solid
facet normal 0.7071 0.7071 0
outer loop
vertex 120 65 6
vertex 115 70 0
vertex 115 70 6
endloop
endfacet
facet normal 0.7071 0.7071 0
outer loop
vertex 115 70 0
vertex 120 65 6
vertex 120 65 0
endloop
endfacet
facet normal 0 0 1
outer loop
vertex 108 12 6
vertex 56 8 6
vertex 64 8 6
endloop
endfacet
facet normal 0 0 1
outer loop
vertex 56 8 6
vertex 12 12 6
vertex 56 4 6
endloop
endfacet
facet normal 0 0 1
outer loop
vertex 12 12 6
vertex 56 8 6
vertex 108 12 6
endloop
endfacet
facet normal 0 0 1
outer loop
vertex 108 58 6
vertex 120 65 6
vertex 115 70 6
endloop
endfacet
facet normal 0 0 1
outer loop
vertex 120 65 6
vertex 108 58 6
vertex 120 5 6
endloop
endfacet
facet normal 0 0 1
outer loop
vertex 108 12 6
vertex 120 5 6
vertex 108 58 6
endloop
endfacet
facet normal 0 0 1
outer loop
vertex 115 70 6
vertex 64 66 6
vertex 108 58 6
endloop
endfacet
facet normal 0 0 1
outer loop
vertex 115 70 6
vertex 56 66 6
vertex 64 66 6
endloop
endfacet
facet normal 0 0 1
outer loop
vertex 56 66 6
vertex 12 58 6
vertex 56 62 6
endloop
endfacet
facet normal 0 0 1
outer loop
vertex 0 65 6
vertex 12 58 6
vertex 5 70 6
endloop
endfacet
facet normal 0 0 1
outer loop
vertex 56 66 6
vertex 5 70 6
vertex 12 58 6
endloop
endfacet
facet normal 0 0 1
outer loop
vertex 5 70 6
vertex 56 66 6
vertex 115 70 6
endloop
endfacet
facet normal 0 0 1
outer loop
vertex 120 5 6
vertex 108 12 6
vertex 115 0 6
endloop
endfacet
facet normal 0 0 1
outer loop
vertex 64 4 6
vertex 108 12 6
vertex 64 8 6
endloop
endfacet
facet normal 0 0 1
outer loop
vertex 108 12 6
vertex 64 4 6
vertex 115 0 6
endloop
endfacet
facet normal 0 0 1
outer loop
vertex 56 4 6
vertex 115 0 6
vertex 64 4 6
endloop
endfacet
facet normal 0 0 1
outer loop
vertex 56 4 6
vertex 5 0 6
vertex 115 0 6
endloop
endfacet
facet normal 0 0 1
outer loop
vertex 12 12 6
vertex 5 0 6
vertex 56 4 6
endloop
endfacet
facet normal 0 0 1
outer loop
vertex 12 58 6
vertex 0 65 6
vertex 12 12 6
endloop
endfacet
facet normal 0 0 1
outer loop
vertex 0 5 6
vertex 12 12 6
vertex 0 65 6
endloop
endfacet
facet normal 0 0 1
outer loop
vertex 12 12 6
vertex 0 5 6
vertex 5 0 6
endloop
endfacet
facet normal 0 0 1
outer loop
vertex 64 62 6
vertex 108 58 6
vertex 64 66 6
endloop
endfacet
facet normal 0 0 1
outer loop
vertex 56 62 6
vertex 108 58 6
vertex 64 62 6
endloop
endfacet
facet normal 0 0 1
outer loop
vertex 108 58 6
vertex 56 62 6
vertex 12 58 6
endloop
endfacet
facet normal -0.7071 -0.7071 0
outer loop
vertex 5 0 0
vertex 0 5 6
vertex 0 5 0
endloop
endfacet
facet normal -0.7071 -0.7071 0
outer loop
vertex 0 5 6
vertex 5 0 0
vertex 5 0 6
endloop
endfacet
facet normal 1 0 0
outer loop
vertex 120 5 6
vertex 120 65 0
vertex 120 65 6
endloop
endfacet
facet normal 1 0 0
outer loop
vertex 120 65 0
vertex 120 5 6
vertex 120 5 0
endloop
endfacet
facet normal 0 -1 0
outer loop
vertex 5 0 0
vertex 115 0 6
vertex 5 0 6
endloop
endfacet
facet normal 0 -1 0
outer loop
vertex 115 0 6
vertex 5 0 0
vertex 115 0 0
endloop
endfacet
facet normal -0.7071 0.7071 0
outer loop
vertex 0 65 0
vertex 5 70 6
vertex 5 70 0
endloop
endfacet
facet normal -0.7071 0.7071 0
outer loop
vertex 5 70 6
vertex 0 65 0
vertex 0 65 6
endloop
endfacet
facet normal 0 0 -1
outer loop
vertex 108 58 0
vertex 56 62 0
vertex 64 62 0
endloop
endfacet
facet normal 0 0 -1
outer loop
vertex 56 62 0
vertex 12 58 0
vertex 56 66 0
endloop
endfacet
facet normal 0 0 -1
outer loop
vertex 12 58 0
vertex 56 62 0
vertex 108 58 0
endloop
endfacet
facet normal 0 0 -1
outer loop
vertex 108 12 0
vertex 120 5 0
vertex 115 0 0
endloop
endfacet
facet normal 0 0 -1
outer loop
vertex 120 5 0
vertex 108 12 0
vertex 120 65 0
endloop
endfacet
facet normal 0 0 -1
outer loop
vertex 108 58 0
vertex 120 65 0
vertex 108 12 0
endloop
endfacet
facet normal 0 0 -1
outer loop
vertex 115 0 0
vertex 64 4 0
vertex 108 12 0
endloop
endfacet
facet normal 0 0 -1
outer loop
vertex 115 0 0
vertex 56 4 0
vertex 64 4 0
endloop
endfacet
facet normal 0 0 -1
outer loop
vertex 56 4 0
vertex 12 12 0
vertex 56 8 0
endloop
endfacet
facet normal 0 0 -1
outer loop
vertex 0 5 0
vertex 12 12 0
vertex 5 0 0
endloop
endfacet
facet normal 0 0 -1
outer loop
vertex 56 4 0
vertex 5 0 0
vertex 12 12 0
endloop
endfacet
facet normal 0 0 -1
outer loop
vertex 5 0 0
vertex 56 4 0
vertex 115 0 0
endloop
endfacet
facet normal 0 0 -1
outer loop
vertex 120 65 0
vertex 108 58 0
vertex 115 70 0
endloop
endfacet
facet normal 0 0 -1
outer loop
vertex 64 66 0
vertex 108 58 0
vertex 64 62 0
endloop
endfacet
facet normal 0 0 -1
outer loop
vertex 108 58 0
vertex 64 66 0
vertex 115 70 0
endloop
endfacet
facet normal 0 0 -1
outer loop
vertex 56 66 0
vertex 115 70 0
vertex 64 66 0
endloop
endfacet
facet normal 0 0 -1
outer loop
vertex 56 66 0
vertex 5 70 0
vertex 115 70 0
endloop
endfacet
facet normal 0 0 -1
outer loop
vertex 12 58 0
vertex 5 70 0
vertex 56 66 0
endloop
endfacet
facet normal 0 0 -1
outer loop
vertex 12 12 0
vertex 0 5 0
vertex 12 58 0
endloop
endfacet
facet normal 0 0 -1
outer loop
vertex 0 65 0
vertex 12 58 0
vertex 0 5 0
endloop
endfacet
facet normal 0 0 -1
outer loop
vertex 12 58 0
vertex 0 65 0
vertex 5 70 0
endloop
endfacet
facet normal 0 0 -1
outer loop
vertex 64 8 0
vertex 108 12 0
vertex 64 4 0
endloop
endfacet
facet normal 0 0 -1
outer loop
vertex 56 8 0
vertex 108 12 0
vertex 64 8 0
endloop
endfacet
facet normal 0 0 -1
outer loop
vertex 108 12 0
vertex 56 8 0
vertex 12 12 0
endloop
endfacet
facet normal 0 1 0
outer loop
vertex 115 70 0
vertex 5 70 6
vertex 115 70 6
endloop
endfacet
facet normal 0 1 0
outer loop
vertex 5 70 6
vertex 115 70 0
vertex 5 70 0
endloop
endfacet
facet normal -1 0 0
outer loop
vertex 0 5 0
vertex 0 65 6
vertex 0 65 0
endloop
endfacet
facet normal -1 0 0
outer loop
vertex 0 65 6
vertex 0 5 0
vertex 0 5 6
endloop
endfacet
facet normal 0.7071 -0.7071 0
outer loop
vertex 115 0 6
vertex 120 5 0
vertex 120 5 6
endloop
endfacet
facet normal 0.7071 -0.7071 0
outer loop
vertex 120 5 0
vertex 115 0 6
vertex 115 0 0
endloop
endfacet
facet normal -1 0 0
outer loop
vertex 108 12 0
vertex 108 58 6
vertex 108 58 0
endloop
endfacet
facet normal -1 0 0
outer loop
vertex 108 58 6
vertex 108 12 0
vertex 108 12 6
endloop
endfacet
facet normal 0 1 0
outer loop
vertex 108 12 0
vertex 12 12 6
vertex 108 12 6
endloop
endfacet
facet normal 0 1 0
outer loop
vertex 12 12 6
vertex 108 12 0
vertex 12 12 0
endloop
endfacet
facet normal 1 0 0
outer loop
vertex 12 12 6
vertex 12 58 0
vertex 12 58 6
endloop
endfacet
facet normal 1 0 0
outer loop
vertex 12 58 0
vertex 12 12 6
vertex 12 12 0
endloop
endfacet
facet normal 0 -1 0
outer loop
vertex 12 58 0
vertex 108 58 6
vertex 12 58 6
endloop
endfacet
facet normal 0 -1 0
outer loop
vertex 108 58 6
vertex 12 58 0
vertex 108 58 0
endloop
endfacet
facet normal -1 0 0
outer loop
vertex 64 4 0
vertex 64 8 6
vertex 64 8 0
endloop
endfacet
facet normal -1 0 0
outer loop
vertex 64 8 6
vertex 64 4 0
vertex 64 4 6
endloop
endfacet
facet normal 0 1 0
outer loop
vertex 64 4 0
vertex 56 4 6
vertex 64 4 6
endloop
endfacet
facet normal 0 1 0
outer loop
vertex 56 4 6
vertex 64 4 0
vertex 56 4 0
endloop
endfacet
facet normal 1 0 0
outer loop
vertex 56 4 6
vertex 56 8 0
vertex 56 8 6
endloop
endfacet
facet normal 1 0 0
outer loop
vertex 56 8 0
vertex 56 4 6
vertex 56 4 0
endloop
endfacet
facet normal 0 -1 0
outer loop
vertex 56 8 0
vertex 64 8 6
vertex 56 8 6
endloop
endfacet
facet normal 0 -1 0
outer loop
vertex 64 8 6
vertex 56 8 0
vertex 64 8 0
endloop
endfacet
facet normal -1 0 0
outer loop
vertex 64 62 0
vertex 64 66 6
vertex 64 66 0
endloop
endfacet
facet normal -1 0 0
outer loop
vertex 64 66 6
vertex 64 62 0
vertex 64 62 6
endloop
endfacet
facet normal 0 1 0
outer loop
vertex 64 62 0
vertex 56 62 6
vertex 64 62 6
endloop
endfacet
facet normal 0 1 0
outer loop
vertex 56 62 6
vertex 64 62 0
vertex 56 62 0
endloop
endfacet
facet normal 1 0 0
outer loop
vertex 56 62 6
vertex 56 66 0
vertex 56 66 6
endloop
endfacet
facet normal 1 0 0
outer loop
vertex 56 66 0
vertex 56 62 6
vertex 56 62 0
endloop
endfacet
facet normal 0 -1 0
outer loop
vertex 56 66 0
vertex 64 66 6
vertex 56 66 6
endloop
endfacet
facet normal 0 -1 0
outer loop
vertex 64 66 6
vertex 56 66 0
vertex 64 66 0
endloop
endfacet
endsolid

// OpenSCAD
$fn = 32;

// ----------------------------------------------------------------------
// Frame plate: 120 x 70 frame, 12 mm rails
// ----------------------------------------------------------------------

// --- parameters (mm) ---
plate_l = 120;            // plate length, X
plate_w = 70;             // plate width, Y
plate_t = 6;              // plate thickness, Z (extrusion height)
corner_c = 5;             // corner chamfer
frame_bar = 12;           // frame rail width
slot_l = 8;               // adjustment slot length
slot_w = 4;               // adjustment slot width

win_l = plate_l - 2 * frame_bar;  // window length
win_w = plate_w - 2 * frame_bar;  // window width

profile = [[5, 0], [115, 0], [120, 5], [120, 65], [115, 70], [5, 70], [0, 65], [0, 5]];  // primary outline, 8 points, counter clockwise
void_1 = [[12, 12], [108, 12], [108, 58], [12, 58]];  // the window, 4 points
void_2 = [[56, 4], [64, 4], [64, 8], [56, 8]];  // adjustment slot, 4 points
void_3 = [[56, 62], [64, 62], [64, 66], [56, 66]];  // adjustment slot, 4 points

// --- the one profile operation ---
difference() {
  linear_extrude(height = plate_t) polygon(points = profile);
  translate([0, 0, -1])
    linear_extrude(height = plate_t + 2) polygon(points = void_1);
  translate([0, 0, -1])
    linear_extrude(height = plate_t + 2) polygon(points = void_2);
  translate([0, 0, -1])
    linear_extrude(height = plate_t + 2) polygon(points = void_3);
}
